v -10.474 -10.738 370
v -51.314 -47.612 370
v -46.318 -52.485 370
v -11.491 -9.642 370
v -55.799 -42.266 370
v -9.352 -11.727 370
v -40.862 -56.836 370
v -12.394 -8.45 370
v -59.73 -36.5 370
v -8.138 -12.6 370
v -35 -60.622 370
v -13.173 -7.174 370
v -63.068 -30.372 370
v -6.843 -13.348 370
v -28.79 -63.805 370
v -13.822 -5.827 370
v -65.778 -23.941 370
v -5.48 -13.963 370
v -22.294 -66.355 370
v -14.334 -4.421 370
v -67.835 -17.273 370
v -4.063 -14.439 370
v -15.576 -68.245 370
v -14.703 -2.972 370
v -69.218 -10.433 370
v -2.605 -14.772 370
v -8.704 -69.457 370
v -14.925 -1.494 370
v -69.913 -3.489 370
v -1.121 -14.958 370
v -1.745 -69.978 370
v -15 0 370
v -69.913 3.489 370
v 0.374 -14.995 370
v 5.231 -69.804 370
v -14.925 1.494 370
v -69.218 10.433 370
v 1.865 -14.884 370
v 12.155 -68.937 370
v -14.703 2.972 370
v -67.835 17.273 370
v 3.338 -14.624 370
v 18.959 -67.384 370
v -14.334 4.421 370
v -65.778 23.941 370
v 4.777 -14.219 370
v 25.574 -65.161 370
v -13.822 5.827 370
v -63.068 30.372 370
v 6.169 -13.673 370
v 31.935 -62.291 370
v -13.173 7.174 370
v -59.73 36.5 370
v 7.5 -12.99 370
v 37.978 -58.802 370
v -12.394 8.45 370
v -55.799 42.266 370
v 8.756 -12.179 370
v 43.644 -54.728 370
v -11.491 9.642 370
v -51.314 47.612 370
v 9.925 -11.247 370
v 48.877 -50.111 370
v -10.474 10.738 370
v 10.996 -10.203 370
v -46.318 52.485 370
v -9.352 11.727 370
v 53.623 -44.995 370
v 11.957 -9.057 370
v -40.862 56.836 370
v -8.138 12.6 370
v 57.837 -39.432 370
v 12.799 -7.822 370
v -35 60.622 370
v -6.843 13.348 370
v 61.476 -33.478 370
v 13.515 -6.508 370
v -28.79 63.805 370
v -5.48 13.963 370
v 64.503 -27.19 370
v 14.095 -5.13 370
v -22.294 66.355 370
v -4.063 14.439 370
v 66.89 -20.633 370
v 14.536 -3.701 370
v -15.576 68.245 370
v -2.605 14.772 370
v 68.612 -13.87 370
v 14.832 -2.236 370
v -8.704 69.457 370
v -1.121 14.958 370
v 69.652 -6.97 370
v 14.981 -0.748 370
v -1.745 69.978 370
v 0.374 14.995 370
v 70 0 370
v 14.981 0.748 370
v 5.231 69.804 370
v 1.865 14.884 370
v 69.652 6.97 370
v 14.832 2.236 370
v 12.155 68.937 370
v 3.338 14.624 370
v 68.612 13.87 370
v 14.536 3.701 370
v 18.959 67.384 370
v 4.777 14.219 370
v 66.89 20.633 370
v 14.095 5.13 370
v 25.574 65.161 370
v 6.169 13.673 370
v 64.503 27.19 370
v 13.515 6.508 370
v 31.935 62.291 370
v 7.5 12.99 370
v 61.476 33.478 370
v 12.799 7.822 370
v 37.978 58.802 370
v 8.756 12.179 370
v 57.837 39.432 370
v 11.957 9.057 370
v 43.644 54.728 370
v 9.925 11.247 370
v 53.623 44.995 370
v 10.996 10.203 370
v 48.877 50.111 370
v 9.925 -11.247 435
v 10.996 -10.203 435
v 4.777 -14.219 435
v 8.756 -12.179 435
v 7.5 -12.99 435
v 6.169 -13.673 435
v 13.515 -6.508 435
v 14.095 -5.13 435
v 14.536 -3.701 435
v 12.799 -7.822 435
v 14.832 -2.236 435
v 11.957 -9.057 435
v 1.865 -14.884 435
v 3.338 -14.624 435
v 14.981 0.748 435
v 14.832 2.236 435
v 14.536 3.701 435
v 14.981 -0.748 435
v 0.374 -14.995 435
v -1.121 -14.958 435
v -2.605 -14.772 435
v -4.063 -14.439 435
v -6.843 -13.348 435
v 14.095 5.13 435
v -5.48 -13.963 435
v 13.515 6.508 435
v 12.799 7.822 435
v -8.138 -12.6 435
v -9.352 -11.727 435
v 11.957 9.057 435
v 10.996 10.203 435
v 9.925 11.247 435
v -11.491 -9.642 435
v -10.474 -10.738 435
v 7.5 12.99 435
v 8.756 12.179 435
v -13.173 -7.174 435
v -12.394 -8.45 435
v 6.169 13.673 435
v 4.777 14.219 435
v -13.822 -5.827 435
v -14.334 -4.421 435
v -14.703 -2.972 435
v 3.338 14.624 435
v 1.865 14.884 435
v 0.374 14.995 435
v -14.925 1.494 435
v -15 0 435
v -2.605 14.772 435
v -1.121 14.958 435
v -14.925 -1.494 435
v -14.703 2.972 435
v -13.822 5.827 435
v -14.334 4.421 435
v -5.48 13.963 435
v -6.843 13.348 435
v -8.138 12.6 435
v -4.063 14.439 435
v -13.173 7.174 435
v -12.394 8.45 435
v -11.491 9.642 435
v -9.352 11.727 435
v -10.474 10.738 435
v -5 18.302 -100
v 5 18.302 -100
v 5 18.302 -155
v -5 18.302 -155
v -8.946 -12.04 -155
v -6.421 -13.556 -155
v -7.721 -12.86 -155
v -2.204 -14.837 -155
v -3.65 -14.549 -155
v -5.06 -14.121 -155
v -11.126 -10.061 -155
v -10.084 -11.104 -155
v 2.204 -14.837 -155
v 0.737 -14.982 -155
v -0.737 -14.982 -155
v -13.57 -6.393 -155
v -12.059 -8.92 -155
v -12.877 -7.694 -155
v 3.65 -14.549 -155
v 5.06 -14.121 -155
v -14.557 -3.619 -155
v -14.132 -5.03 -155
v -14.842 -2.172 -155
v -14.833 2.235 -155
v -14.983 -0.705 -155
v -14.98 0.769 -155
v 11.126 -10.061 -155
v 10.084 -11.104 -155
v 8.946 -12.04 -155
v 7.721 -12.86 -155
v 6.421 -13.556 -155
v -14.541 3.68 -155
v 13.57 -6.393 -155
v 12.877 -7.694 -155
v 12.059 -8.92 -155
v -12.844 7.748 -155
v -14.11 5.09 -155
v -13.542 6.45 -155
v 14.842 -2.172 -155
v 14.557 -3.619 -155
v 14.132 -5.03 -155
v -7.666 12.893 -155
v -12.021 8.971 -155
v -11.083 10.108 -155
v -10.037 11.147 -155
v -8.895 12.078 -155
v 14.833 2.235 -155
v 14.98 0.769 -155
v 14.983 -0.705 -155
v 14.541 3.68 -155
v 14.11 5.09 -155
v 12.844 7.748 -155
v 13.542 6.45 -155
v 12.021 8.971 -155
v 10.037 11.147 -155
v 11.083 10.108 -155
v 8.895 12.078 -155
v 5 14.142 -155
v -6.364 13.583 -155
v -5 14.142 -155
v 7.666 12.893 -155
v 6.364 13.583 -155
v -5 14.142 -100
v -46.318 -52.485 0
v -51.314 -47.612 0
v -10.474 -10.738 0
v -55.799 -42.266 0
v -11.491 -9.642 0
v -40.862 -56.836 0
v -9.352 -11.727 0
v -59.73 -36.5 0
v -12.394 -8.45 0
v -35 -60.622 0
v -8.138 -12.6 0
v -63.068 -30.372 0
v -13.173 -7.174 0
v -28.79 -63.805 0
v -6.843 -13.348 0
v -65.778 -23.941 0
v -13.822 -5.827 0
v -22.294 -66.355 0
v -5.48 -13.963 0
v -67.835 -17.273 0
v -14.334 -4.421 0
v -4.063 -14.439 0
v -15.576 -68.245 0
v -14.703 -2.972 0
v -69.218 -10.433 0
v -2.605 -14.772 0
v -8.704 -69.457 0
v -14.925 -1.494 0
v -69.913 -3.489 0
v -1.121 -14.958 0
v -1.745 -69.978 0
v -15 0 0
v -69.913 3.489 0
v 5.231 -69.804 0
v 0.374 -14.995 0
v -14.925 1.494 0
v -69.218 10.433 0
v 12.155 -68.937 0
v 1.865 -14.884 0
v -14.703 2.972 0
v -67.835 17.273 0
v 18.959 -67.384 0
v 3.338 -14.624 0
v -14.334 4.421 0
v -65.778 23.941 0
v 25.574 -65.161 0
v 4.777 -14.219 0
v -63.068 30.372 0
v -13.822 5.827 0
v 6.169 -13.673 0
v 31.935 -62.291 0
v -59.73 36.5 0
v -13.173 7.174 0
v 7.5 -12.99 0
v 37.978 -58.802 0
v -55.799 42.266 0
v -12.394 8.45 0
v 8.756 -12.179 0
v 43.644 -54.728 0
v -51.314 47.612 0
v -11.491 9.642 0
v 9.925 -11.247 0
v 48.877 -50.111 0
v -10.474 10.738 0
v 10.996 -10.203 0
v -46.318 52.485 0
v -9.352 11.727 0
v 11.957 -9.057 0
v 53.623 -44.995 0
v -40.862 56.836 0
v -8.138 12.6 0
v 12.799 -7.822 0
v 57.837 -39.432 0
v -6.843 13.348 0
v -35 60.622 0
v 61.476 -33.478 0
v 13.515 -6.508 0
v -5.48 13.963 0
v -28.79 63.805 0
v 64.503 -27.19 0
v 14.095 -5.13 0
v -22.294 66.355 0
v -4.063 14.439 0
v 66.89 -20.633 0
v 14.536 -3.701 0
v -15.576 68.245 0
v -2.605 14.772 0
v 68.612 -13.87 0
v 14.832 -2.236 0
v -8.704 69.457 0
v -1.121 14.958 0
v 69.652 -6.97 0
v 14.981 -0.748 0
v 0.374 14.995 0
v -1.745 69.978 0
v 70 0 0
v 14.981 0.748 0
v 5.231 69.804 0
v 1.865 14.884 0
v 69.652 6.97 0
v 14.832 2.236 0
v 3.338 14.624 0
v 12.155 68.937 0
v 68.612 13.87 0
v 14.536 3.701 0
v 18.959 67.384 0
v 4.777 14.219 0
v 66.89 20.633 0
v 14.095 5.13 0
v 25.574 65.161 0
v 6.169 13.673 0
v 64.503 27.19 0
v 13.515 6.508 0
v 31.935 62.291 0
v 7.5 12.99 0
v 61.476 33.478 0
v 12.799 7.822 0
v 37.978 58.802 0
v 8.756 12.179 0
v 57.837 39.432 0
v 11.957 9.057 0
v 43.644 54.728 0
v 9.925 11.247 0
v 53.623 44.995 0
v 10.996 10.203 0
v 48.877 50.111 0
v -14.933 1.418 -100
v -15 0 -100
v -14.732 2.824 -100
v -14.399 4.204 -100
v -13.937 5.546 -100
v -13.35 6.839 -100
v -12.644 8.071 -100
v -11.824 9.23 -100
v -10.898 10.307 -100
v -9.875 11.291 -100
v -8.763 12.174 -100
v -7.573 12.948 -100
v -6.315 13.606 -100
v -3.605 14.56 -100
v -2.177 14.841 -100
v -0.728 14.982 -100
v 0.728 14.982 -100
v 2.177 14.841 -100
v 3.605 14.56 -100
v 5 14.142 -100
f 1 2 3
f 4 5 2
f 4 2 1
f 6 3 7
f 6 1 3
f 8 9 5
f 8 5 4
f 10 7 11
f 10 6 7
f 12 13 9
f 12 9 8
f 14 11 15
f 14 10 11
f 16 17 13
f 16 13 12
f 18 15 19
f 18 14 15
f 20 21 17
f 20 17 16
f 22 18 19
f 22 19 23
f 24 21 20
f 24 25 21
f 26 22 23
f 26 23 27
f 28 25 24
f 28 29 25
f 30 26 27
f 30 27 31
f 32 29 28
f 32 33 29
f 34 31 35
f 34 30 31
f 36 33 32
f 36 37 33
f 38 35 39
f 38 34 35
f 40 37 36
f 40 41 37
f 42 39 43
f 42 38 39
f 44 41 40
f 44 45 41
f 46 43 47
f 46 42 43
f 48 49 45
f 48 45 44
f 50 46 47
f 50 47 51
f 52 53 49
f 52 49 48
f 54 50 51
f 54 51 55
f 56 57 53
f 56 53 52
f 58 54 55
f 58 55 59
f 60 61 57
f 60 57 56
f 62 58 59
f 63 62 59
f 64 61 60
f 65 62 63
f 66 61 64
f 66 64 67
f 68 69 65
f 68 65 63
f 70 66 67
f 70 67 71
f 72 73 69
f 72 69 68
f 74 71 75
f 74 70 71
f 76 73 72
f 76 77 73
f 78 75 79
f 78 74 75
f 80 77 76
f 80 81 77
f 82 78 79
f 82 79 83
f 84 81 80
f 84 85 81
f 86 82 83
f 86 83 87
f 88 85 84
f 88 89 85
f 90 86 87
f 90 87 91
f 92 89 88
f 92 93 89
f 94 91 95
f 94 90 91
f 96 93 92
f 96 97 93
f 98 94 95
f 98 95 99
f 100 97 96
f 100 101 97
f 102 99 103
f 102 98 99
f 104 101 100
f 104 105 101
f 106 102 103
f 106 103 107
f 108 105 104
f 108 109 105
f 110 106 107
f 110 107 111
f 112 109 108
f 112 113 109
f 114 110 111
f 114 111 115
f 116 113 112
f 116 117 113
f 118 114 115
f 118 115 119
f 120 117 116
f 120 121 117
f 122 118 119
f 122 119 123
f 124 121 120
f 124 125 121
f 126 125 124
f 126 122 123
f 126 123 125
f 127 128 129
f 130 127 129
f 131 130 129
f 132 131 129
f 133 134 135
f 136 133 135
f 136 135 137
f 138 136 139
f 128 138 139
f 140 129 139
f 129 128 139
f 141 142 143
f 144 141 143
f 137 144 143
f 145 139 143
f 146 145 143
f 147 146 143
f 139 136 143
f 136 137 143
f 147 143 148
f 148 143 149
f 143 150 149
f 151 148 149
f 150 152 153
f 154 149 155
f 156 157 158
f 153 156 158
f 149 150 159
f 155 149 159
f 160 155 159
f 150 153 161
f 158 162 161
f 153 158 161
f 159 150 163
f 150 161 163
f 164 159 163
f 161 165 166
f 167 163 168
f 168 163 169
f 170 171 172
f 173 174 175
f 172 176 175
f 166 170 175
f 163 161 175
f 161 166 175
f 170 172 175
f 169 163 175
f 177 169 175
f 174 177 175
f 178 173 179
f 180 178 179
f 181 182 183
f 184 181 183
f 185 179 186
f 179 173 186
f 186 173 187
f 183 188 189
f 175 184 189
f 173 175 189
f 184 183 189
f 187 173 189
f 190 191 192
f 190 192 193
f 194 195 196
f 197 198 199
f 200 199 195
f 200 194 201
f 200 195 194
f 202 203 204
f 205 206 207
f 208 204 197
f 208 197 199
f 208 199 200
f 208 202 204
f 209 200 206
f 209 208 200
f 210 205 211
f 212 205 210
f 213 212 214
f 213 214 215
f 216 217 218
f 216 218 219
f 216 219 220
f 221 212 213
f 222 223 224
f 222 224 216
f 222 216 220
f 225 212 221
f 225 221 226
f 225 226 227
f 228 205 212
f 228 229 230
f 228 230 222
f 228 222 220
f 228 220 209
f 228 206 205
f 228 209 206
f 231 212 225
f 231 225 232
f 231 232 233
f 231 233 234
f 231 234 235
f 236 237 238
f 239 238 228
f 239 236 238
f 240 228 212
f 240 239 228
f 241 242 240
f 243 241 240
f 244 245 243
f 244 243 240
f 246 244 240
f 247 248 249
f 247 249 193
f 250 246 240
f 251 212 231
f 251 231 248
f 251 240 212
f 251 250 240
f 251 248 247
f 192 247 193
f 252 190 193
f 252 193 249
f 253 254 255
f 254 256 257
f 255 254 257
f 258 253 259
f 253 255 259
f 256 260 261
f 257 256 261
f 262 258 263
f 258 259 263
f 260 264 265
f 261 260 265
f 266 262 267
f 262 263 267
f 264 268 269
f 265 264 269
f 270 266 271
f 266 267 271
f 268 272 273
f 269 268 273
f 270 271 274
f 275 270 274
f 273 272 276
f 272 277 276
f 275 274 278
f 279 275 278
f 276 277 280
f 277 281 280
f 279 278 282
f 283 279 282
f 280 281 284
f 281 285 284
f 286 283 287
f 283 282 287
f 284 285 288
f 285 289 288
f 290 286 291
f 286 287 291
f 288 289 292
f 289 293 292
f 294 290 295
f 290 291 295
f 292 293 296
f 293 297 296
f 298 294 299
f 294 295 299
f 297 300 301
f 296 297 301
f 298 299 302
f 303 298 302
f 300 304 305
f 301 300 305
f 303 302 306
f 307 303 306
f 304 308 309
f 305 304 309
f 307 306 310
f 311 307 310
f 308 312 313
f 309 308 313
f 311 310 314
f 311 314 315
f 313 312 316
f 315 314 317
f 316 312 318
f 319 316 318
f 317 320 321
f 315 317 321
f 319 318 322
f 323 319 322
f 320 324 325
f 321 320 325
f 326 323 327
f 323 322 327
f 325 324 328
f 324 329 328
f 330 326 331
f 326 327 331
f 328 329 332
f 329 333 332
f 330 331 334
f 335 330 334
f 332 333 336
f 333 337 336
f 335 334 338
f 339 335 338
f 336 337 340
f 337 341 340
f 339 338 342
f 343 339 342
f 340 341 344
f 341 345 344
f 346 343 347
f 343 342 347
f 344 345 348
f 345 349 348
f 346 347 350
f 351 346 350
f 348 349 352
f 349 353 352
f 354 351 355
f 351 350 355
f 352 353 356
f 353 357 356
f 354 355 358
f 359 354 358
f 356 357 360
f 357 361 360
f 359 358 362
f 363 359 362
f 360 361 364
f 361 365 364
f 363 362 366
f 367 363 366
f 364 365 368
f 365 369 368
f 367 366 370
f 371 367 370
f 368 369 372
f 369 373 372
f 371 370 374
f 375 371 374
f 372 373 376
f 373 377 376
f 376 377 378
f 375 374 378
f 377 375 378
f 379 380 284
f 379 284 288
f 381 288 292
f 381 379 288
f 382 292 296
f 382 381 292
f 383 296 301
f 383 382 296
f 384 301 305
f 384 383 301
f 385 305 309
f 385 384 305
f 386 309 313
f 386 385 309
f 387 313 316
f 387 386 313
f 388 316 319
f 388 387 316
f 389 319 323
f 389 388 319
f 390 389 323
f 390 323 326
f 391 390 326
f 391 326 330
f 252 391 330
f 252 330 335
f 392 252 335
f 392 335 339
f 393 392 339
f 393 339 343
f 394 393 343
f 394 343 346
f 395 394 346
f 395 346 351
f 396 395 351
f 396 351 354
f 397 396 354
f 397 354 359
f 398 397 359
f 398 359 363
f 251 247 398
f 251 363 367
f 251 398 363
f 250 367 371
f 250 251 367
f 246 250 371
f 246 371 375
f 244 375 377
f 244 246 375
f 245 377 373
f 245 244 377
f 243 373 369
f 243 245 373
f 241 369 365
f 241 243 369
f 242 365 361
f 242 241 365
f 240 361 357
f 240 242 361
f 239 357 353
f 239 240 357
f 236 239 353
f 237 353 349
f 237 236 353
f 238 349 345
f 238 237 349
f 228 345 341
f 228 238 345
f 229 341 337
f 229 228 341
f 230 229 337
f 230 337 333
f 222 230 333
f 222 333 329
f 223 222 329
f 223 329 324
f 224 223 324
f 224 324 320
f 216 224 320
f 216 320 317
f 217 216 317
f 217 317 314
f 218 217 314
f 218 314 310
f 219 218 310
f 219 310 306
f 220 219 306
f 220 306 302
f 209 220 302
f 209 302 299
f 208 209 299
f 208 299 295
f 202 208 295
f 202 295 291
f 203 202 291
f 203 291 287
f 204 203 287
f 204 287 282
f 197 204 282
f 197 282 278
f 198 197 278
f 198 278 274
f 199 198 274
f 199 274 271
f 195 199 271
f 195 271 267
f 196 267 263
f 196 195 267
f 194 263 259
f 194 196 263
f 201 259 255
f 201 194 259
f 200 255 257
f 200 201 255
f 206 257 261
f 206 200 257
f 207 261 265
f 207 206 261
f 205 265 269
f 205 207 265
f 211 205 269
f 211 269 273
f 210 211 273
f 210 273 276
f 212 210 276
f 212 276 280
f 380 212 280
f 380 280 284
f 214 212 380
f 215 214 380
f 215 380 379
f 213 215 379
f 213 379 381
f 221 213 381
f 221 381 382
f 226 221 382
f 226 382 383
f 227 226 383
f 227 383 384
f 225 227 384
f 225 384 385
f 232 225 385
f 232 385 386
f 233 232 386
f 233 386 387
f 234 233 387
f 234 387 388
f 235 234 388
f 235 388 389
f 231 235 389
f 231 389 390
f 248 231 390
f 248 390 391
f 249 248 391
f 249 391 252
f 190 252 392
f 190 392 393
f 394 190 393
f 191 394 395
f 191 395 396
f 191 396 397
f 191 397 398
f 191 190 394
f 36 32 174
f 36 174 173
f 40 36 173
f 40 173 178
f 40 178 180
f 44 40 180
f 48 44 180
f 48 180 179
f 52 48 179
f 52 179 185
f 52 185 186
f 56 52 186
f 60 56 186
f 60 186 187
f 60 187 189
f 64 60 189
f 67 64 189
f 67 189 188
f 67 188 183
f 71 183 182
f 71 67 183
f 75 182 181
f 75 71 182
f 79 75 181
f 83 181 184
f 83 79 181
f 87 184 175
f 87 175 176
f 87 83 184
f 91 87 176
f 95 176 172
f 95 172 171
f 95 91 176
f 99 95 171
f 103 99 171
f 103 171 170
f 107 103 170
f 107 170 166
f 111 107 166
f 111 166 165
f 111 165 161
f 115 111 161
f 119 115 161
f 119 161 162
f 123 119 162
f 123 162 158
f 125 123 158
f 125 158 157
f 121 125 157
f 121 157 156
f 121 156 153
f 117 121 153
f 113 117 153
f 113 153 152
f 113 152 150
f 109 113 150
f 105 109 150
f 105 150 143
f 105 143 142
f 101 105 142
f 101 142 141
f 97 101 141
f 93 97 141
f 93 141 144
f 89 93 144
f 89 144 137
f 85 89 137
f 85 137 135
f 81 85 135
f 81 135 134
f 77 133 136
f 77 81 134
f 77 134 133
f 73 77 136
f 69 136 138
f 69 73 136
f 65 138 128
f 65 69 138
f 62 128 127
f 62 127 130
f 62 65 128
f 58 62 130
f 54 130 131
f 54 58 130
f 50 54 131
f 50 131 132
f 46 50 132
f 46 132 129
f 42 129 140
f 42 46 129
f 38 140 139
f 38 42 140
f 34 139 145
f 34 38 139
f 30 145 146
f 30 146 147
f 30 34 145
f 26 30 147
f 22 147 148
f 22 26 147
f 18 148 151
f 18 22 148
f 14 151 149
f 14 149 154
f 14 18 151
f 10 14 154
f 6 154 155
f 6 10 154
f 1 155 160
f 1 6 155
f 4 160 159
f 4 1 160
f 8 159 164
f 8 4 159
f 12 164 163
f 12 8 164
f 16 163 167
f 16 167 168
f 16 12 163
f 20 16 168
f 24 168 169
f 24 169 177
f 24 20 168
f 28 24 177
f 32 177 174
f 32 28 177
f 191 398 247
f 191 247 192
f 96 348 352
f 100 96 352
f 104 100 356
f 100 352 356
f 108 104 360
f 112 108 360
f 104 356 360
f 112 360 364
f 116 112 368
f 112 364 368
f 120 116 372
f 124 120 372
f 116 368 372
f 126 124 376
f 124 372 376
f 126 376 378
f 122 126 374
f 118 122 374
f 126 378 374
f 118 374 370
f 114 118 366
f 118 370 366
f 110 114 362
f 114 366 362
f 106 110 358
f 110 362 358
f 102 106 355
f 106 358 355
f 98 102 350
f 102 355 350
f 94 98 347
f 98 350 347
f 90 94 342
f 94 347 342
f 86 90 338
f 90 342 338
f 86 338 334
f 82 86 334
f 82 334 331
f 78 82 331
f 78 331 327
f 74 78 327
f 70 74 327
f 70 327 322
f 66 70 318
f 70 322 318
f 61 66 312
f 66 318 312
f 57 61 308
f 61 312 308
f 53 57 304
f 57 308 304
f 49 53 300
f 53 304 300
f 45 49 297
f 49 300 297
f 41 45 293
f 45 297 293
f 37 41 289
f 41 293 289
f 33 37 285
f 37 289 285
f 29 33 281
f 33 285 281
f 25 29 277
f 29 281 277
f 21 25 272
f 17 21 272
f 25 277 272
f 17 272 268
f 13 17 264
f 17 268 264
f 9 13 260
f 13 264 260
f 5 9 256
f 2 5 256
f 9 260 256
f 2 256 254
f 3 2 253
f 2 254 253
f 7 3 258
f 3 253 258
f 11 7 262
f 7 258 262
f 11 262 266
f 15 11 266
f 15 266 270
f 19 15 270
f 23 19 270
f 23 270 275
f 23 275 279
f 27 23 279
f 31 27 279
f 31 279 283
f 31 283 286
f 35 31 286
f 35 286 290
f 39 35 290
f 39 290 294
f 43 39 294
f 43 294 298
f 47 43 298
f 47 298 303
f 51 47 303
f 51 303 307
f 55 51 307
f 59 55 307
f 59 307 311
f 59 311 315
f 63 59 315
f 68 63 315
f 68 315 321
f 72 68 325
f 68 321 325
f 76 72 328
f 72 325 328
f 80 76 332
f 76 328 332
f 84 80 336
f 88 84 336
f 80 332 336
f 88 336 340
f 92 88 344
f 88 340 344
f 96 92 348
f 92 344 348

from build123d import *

# Parameters (mm, degrees)
SKETCH1_R           = 70
BOSS_EXTRUDE1_DEPTH = 370
SKETCH4_R           = 10
BOSS_EXTRUDE2_DEPTH = 80
BOSS_EXTRUDE3_START = 100
SKETCH5_R           = 10
BOSS_EXTRUDE3_DEPTH = 100
CUT_EXTRUDE1_START  = -15
SKETCH6_R           = 10
CUT_EXTRUDE1_DEPTH  = 15
BOSS_EXTRUDE4_DEPTH = 25
SKETCH8_R           = 15
BOSS_EXTRUDE5_DEPTH = 535
BOSS_EXTRUDE7_DEPTH = 55
BOSS_EXTRUDE8_START = 55
SKETCH10_R          = 15
BOSS_EXTRUDE8_DEPTH = 55


with BuildPart() as part:
    # Sketch1 → Boss-Extrude1 (new body)
    with BuildSketch(Plane.XY):
        Circle(SKETCH1_R)
    extrude(amount=BOSS_EXTRUDE1_DEPTH)

    # Sketch4 → Boss-Extrude2 (add)
    with BuildSketch(Plane.XY.offset(370)):
        Circle(SKETCH4_R)
    extrude(amount=BOSS_EXTRUDE2_DEPTH)

    # Sketch5 → Boss-Extrude3 (add)
    with BuildSketch(Plane(origin=(0, 0, 0), x_dir=(-1, 0, 0), z_dir=(0, 0, -1)).offset(BOSS_EXTRUDE3_START)):
        with Locations(Location((0, 0, 0), (0, 0, 180))):
            Circle(SKETCH5_R)
    extrude(amount=-BOSS_EXTRUDE3_DEPTH)

    # Sketch6 → Cut-Extrude1 (cut)
    with BuildSketch(Plane.XY.offset(450).offset(CUT_EXTRUDE1_START)):
        Circle(SKETCH6_R)
    extrude(amount=CUT_EXTRUDE1_DEPTH, mode=Mode.SUBTRACT)

    # Sketch7 → Boss-Extrude4 (add)
    with BuildSketch(Plane(origin=(0, 0, -100), x_dir=(-1, 0, 0), z_dir=(0, 0, -1))):
        with BuildLine():
            Line((5, 8.660254038), (5, 12.820254038))
            Line((5, 12.820254038), (-5, 12.820254038))
            Line((-5, 12.820254038), (-5, 8.660254038))
            ThreePointArc((-5, 8.660254038), (0, 10), (5, 8.660254038))
        make_face()
    extrude(amount=-BOSS_EXTRUDE4_DEPTH)

    # Sketch8 → Boss-Extrude5 (add)
    with BuildSketch(Plane(origin=(0, 0, -100), x_dir=(-1, 0, 0), z_dir=(0, 0, -1))):
        Circle(SKETCH8_R)
    extrude(amount=-BOSS_EXTRUDE5_DEPTH)



with BuildPart() as body_2:
    # Sketch9 → Boss-Extrude7 (new body)
    with BuildSketch(Plane(origin=(0, 0, -100), x_dir=(-1, 0, 0), z_dir=(0, 0, -1))):
        with BuildLine():
            Line((-5, 14.142135624), (-5, 18.302135624))
            Line((-5, 18.302135624), (5, 18.302135624))
            Line((5, 18.302135624), (5, 14.142135624))
            ThreePointArc((5, 14.142135624), (0, 15), (-5, 14.142135624))
        make_face()
    extrude(amount=BOSS_EXTRUDE7_DEPTH)


with BuildPart() as part_1:
    add(part.part)

    add(body_2.part)  # Boss-Extrude8 merges body 2
    # Sketch10 → Boss-Extrude8 (add)
    with BuildSketch(Plane(origin=(0, 0, -100), x_dir=(-1, 0, 0), z_dir=(0, 0, -1)).offset(BOSS_EXTRUDE8_START)):
        with Locations(Location((0, 0, 0), (0, 0, 70.528779366))):
            Circle(SKETCH10_R)
    extrude(amount=-BOSS_EXTRUDE8_DEPTH)


solid = part_1.part
